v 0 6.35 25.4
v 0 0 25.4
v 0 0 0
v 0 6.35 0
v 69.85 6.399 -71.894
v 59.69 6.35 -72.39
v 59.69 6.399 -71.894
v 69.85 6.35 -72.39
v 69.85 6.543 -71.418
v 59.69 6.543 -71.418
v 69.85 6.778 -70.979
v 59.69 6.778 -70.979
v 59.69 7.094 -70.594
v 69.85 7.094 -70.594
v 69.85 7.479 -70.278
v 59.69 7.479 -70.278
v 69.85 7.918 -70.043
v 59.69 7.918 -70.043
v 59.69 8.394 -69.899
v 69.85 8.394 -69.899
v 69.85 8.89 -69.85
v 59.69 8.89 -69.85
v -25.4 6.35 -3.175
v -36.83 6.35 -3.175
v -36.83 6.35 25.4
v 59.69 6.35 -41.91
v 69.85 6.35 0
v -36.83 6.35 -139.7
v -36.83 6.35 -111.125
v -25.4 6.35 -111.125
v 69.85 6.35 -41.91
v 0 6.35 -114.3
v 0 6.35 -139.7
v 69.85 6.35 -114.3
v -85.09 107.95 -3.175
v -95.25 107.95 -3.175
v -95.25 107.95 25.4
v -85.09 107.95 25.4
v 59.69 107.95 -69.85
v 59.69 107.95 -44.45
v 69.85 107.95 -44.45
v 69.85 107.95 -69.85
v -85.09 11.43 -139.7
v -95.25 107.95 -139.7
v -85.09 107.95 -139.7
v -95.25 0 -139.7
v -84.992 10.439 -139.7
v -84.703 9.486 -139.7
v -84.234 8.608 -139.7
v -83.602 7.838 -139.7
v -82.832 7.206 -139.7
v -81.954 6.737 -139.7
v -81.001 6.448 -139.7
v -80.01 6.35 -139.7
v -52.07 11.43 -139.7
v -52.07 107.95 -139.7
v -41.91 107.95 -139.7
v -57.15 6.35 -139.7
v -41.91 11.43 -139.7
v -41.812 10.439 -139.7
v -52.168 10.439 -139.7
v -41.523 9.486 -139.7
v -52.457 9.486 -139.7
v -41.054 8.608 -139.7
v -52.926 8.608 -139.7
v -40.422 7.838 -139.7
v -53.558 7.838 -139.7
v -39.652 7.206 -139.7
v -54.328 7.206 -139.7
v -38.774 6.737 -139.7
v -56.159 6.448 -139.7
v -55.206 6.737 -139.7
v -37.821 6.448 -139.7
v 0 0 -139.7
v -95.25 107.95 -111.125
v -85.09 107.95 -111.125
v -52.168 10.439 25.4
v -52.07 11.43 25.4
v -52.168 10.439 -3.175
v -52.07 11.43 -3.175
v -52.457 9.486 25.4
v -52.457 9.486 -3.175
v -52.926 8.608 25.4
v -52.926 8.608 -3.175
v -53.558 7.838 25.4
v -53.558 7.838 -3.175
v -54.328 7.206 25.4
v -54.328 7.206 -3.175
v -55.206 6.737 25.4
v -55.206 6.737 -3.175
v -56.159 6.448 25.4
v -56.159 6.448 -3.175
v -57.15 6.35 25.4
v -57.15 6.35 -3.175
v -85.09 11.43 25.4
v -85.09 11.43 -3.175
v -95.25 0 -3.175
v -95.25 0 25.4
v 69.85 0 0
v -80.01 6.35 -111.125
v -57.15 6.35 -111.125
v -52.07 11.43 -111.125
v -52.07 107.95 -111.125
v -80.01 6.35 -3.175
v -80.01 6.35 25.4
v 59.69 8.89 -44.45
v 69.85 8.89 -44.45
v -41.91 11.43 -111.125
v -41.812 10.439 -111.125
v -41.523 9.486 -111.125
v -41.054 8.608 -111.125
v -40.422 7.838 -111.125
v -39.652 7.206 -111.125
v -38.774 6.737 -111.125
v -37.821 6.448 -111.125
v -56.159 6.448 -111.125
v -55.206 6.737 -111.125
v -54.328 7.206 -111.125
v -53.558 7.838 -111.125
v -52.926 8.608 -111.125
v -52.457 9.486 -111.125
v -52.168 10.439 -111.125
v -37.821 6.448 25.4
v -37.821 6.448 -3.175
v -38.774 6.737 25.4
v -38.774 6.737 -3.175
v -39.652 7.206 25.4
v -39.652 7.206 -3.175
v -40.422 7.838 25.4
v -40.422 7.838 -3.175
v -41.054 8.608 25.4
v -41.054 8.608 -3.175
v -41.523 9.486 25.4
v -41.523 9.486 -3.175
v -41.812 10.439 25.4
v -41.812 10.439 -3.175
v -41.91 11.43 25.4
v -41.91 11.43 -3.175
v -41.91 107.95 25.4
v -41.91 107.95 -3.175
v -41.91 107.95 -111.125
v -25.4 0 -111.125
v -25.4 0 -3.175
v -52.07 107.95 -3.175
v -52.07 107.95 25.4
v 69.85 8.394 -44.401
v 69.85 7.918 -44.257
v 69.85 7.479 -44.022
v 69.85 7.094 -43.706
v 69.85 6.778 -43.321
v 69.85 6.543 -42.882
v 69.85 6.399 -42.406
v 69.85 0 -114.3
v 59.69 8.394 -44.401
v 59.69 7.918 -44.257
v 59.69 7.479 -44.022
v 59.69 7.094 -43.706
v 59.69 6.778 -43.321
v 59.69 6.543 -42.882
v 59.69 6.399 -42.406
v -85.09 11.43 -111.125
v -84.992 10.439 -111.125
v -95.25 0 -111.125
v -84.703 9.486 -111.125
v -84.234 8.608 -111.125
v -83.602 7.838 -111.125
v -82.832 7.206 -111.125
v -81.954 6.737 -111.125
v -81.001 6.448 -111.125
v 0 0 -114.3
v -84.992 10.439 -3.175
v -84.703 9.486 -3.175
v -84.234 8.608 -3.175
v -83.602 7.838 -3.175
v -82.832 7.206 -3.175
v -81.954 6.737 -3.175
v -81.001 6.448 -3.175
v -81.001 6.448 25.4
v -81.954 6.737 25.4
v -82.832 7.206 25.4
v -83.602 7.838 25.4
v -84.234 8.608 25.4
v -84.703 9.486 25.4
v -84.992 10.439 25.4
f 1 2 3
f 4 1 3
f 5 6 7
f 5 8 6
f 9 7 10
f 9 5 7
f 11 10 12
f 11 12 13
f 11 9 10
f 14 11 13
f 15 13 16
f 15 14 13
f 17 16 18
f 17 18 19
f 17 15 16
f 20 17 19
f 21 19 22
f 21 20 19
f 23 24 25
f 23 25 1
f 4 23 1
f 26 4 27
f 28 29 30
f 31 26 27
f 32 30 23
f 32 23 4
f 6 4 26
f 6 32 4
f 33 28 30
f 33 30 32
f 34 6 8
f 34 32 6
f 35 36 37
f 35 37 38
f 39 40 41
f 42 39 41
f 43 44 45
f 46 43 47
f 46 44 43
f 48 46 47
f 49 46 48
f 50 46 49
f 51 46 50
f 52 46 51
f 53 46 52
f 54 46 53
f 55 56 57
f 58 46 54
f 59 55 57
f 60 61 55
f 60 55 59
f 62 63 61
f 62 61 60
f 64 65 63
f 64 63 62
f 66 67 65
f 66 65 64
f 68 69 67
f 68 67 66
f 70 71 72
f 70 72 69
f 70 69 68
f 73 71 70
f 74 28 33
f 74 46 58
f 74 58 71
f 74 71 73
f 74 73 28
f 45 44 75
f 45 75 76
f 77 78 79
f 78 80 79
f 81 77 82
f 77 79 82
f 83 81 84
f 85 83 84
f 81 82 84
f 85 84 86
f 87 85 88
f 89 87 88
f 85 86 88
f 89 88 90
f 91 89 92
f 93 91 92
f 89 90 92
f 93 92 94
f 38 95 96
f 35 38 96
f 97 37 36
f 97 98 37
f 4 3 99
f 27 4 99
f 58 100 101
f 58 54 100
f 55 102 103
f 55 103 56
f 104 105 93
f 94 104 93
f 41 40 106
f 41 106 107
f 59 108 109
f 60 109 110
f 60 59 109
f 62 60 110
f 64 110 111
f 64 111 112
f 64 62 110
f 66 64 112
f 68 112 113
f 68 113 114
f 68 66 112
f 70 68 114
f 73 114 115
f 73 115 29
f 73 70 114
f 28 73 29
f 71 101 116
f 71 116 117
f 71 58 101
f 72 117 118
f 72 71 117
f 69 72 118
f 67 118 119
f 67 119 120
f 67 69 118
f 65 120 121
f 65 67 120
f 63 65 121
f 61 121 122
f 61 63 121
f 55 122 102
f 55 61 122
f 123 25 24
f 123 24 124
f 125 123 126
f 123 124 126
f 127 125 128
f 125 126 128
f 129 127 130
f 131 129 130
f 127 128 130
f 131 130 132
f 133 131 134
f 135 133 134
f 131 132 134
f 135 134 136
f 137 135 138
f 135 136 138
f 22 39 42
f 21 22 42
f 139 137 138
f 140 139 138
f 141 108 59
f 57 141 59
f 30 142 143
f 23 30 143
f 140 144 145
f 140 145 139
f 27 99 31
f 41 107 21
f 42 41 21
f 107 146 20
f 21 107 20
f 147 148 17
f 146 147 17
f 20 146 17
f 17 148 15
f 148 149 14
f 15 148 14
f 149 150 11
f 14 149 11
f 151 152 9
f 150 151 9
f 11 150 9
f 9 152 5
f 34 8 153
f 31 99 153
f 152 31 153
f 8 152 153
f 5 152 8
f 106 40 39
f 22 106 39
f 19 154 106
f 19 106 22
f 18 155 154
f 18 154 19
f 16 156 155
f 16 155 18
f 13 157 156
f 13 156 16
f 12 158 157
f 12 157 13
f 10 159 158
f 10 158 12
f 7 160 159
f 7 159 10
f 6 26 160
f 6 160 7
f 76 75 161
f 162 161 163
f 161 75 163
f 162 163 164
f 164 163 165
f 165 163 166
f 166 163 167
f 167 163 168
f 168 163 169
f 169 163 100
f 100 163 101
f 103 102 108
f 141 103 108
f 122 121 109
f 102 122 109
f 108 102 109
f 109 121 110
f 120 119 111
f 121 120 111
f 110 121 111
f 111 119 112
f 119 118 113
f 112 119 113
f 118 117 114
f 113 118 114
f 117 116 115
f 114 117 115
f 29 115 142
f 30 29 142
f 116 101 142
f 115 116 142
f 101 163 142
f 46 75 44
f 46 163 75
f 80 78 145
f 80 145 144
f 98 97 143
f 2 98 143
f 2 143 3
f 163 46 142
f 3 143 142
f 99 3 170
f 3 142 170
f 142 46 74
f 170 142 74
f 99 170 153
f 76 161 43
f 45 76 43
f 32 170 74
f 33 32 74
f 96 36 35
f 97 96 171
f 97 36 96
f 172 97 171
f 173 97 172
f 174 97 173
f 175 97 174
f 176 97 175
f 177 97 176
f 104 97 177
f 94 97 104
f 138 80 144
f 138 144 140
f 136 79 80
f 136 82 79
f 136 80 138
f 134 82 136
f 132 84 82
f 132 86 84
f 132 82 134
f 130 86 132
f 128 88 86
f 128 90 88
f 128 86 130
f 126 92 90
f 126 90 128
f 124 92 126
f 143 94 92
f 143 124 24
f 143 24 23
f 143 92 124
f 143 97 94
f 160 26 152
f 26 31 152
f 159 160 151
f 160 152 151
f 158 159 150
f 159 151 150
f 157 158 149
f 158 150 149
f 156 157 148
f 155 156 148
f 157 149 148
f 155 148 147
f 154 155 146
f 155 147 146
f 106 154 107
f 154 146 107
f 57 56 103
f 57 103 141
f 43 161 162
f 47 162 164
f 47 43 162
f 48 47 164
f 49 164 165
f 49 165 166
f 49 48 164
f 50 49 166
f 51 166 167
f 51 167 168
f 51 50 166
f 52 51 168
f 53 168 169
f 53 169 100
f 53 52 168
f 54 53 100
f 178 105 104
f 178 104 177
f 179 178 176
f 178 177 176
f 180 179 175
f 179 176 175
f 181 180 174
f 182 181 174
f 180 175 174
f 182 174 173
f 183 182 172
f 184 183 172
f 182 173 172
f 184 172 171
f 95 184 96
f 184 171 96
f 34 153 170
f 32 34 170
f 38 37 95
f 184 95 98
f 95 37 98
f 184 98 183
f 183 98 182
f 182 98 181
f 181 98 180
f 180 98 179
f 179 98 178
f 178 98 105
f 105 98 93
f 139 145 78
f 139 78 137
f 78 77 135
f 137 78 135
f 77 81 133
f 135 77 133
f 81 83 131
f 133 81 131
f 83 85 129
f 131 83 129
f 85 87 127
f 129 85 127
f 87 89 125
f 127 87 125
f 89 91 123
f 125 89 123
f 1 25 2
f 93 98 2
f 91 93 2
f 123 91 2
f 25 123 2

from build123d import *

# Parameters (mm, degrees)
BOSS_EXTRUDE1_DEPTH = 6.35
SKETCH4_W           = 10.16
SKETCH4_H           = 28.575
BOSS_EXTRUDE4_DEPTH = 101.6
SKETCH5_W           = 10.16
SKETCH5_H           = 28.575
BOSS_EXTRUDE5_DEPTH = 101.6
SKETCH6_W           = 10.16
SKETCH6_H           = 25.4
BOSS_EXTRUDE7_DEPTH = 101.6
FILLET2_R           = 5.08
FILLET3_R           = 5.08
FILLET4_R           = 5.08
FILLET5_R           = 5.08
FILLET6_R           = 5.08
FILLET7_R           = 5.08
FILLET8_R           = 2.54
FILLET9_R           = 2.54


with BuildPart() as part:
    # Sketch1 → Boss-Extrude1 (new body)
    with BuildSketch(Plane(origin=(0, 0, 0), x_dir=(1, 0, 0), z_dir=(0, 1, 0))):
        Polygon((0, 114.3), (0, 139.7), (-95.25, 139.7), (-95.25, 111.125), (-25.4, 111.125), (-25.4, 3.175), (-95.25, 3.175), (-95.25, -25.4), (0, -25.4), (0, 0), (69.85, 0), (69.85, 114.3), align=None)
    extrude(amount=BOSS_EXTRUDE1_DEPTH)

    # Sketch4 → Boss-Extrude4 (add)
    with BuildSketch(Plane(origin=(0, 6.35, 0), x_dir=(1, 0, 0), z_dir=(0, 1, 0))):
        with Locations((-90.17, -11.1125)):
            Rectangle(SKETCH4_W, SKETCH4_H)
        with Locations((-46.99, -11.1125)):
            Rectangle(SKETCH4_W, SKETCH4_H)
    extrude(amount=BOSS_EXTRUDE4_DEPTH)

    # Sketch5 → Boss-Extrude5 (add)
    with BuildSketch(Plane(origin=(0, 6.35, 0), x_dir=(1, 0, 0), z_dir=(0, 1, 0))):
        with Locations((-90.17, 125.4125)):
            Rectangle(SKETCH5_W, SKETCH5_H)
        with Locations((-46.99, 125.4125)):
            Rectangle(SKETCH5_W, SKETCH5_H)
    extrude(amount=BOSS_EXTRUDE5_DEPTH)

    # Sketch6 → Boss-Extrude7 (add)
    with BuildSketch(Plane(origin=(0, 6.35, 0), x_dir=(1, 0, 0), z_dir=(0, 1, 0))):
        with Locations((64.77, 57.15)):
            Rectangle(SKETCH6_W, SKETCH6_H)
    extrude(amount=BOSS_EXTRUDE7_DEPTH)

    # Fillet2
    fillet2_edges = [part.edges().sort_by_distance(p)[0] for p in [
        (-41.91, 6.35, 11.1125),
    ]]
    fillet(fillet2_edges, radius=FILLET2_R)

    # Fillet3
    fillet3_edges = [part.edges().sort_by_distance(p)[0] for p in [
        (-52.07, 6.35, 11.1125),
    ]]
    fillet(fillet3_edges, radius=FILLET3_R)

    # Fillet4
    fillet4_edges = [part.edges().sort_by_distance(p)[0] for p in [
        (-85.09, 6.35, 11.1125),
    ]]
    fillet(fillet4_edges, radius=FILLET4_R)

    # Fillet5
    fillet5_edges = [part.edges().sort_by_distance(p)[0] for p in [
        (-85.09, 6.35, -125.4125),
    ]]
    fillet(fillet5_edges, radius=FILLET5_R)

    # Fillet6
    fillet6_edges = [part.edges().sort_by_distance(p)[0] for p in [
        (-52.07, 6.35, -125.4125),
    ]]
    fillet(fillet6_edges, radius=FILLET6_R)

    # Fillet7
    fillet7_edges = [part.edges().sort_by_distance(p)[0] for p in [
        (-41.91, 6.35, -125.4125),
    ]]
    fillet(fillet7_edges, radius=FILLET7_R)

    # Fillet8
    fillet8_edges = [part.edges().sort_by_distance(p)[0] for p in [
        (64.77, 6.35, -44.45),
    ]]
    fillet(fillet8_edges, radius=FILLET8_R)

    # Fillet9
    fillet9_edges = [part.edges().sort_by_distance(p)[0] for p in [
        (64.77, 6.35, -69.85),
    ]]
    fillet(fillet9_edges, radius=FILLET9_R)


solid = part.part
